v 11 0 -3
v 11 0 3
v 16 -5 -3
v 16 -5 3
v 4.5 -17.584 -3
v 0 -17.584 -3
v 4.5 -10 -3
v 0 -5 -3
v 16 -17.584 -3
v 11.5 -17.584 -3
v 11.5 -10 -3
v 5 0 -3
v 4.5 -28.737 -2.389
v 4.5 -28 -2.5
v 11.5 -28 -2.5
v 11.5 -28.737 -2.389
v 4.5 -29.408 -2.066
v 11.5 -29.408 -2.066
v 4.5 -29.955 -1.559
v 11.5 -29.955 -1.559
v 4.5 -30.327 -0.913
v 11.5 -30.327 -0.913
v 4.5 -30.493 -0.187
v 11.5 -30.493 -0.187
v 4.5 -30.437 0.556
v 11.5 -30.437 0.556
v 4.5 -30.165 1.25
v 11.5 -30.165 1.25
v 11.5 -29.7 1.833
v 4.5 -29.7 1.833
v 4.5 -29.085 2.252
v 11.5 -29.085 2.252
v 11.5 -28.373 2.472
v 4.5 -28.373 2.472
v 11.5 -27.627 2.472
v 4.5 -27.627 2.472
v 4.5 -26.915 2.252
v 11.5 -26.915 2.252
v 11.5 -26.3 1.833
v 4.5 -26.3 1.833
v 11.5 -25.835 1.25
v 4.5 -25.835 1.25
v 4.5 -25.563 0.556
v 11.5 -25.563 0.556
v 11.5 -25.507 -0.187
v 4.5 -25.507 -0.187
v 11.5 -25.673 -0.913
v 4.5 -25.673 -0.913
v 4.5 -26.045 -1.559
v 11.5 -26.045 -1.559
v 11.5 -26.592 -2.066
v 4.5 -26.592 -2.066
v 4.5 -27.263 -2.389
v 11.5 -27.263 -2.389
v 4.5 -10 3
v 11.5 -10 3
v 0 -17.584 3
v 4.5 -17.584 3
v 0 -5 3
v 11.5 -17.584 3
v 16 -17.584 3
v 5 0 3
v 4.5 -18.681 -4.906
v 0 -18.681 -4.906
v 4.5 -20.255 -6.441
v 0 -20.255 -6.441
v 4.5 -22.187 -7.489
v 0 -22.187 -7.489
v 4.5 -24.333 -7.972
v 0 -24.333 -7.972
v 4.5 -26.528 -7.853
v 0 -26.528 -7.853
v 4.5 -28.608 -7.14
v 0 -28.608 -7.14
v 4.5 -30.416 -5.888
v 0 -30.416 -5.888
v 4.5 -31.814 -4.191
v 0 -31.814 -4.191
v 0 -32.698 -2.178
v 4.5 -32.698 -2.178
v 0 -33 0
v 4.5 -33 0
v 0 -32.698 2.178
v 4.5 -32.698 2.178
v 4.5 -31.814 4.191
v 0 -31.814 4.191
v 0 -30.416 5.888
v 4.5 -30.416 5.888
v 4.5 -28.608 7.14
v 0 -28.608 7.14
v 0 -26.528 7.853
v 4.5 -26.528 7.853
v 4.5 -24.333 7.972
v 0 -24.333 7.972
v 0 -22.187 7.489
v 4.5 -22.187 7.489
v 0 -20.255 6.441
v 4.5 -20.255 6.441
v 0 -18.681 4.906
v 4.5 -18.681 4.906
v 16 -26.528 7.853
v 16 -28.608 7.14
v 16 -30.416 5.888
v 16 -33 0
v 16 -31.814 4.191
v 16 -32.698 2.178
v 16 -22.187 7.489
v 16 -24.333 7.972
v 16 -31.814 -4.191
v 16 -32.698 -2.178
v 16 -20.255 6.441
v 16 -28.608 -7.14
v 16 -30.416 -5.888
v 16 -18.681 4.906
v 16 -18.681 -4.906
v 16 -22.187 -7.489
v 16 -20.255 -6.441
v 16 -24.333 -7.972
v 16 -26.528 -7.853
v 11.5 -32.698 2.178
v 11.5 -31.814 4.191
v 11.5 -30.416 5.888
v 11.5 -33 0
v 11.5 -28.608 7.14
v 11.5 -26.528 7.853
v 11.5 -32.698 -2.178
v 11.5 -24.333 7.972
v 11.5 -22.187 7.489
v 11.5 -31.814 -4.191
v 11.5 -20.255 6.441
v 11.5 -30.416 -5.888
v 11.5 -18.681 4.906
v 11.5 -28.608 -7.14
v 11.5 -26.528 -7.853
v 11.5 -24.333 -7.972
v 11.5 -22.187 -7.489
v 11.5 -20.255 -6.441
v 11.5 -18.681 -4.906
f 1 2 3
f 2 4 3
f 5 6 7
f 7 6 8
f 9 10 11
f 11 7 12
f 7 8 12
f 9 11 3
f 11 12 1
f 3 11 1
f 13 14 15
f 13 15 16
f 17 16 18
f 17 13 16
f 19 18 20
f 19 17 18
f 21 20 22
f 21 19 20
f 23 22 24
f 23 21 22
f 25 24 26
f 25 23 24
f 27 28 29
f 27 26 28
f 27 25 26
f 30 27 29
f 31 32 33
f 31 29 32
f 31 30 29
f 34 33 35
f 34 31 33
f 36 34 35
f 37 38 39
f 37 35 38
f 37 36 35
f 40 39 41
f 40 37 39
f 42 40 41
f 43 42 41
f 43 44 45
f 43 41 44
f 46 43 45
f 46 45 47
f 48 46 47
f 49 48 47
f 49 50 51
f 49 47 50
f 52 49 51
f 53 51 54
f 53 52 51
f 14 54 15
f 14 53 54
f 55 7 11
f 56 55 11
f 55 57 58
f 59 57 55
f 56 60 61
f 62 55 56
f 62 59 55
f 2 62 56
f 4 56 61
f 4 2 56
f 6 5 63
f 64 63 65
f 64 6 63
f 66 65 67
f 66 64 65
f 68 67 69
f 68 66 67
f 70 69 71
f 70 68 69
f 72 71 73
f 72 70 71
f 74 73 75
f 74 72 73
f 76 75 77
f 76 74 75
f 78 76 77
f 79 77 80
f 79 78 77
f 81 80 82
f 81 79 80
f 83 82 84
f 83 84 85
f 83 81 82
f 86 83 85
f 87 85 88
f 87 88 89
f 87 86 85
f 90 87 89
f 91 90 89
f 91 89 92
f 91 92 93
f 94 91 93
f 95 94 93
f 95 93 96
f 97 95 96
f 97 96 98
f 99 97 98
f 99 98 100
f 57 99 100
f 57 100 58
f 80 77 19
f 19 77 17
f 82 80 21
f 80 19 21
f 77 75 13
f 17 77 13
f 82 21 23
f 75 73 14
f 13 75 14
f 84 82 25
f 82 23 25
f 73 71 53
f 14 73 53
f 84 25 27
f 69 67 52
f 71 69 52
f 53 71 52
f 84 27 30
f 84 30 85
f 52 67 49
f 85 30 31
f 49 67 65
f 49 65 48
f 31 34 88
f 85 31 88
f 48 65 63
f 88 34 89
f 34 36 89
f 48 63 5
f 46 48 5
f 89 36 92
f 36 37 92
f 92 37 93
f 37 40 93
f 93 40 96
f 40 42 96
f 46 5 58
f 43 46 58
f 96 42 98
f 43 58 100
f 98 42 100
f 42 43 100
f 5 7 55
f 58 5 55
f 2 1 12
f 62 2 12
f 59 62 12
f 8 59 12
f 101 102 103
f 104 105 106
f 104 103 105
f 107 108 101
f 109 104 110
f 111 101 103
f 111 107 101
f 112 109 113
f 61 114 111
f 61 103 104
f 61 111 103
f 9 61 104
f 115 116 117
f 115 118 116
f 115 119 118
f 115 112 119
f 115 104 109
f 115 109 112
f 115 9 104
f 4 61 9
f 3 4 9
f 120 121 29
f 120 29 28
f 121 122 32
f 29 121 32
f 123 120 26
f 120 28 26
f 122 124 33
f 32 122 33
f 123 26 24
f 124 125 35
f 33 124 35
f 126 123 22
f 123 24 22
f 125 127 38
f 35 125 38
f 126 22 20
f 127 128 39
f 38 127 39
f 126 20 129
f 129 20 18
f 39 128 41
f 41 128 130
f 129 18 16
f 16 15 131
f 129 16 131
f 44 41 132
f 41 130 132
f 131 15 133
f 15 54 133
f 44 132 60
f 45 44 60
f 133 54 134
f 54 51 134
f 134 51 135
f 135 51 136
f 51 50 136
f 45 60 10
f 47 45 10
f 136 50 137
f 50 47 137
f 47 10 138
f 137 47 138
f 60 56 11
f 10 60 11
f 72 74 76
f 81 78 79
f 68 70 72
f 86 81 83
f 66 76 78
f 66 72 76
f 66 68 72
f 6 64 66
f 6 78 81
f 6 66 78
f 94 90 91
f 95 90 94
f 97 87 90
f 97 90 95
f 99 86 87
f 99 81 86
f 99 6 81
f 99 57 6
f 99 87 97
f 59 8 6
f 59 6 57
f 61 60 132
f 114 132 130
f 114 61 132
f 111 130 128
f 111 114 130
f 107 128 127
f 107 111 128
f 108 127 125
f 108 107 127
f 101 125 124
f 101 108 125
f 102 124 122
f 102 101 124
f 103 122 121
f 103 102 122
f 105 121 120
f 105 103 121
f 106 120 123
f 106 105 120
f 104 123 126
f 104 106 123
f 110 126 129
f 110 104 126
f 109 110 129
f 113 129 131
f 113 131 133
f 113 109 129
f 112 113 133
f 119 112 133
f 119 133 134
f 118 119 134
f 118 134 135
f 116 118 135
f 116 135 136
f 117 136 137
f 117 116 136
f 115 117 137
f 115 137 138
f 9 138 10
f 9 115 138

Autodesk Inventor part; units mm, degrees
ref_plane "YZ Plane" through (0, 0, 0) normal (1, 0, 0) x (0, 1, 0)
ref_plane "XZ Plane" through (0, 0, 0) normal (0, 1, 0) x (-1, 0, 0)
sketch "스케치1" plane through (0, 0, 0) normal (0, 0, 1) x (1, 0, 0)
  line L0 (0, 0) -> (0, -28)
  line L1 (0, -28) -> (4.5, -28)
  line L2 (4.5, -26.5) -> (4.5, -10)
  line L3 (4.5, -10) -> (8, -10)
  line L4 (8, -10) -> (8, 0)
  line L5 (8, 0) -> (0, 0)
  line L6 (4.5, -28) -> (4.5, -26.5)
  dimension "d0" = 28
  dimension "d1" = 10
  dimension "d6" = 8
extrude "돌출1" add sketch "스케치1" along normal mid plane 6
mirror "미러1" about plane through (8, -10, 0) normal (1, 0, 0) of "돌출1"
chamfer "모따기1" distance 5 angle 45 1 edges at (0, 0, 0)
chamfer "모따기2" distance 5 angle 45 1 edges at (16, 0, 0)
sketch "스케치2" plane through (0, -28, -3) normal (-1, 0, 0) x (0, 0, 1)
  circle A0 centre (3, 3) radius 8
  line L0 (0, 0) -> (6, 0) projected
  point P0 (3, 28)
  dimension "d15" = 16
  dimension "d16" = 3
extrude "돌출2" add sketch "스케치2" against normal blind 4.5
ref_plane "작업 평면1" through (8, -10, 3) normal (1, 0, 0) x (0, 0, -1)
mirror "미러2" about plane through (8, -10, 3) normal (1, 0, 0) of "돌출2"
sketch "스케치3" plane through (4.5, -10, 3) normal (1, 0, 0) x (0, 0, -1)
  circle A0 centre (3, -18) radius 2.5
  line L0 (6, 10) -> (6, 5) projected
  point P0 (3, 10)
  dimension "d19" = 5
  dimension "d20" = 28
  dimension "d21" = 3
extrude "돌출3" add sketch "스케치3" along normal blind 7
ref_plane "작업 평면2" through (8, -10, 3) normal (1, 0, 0) x (0, 0, -1)
properties part number "2번부품"
